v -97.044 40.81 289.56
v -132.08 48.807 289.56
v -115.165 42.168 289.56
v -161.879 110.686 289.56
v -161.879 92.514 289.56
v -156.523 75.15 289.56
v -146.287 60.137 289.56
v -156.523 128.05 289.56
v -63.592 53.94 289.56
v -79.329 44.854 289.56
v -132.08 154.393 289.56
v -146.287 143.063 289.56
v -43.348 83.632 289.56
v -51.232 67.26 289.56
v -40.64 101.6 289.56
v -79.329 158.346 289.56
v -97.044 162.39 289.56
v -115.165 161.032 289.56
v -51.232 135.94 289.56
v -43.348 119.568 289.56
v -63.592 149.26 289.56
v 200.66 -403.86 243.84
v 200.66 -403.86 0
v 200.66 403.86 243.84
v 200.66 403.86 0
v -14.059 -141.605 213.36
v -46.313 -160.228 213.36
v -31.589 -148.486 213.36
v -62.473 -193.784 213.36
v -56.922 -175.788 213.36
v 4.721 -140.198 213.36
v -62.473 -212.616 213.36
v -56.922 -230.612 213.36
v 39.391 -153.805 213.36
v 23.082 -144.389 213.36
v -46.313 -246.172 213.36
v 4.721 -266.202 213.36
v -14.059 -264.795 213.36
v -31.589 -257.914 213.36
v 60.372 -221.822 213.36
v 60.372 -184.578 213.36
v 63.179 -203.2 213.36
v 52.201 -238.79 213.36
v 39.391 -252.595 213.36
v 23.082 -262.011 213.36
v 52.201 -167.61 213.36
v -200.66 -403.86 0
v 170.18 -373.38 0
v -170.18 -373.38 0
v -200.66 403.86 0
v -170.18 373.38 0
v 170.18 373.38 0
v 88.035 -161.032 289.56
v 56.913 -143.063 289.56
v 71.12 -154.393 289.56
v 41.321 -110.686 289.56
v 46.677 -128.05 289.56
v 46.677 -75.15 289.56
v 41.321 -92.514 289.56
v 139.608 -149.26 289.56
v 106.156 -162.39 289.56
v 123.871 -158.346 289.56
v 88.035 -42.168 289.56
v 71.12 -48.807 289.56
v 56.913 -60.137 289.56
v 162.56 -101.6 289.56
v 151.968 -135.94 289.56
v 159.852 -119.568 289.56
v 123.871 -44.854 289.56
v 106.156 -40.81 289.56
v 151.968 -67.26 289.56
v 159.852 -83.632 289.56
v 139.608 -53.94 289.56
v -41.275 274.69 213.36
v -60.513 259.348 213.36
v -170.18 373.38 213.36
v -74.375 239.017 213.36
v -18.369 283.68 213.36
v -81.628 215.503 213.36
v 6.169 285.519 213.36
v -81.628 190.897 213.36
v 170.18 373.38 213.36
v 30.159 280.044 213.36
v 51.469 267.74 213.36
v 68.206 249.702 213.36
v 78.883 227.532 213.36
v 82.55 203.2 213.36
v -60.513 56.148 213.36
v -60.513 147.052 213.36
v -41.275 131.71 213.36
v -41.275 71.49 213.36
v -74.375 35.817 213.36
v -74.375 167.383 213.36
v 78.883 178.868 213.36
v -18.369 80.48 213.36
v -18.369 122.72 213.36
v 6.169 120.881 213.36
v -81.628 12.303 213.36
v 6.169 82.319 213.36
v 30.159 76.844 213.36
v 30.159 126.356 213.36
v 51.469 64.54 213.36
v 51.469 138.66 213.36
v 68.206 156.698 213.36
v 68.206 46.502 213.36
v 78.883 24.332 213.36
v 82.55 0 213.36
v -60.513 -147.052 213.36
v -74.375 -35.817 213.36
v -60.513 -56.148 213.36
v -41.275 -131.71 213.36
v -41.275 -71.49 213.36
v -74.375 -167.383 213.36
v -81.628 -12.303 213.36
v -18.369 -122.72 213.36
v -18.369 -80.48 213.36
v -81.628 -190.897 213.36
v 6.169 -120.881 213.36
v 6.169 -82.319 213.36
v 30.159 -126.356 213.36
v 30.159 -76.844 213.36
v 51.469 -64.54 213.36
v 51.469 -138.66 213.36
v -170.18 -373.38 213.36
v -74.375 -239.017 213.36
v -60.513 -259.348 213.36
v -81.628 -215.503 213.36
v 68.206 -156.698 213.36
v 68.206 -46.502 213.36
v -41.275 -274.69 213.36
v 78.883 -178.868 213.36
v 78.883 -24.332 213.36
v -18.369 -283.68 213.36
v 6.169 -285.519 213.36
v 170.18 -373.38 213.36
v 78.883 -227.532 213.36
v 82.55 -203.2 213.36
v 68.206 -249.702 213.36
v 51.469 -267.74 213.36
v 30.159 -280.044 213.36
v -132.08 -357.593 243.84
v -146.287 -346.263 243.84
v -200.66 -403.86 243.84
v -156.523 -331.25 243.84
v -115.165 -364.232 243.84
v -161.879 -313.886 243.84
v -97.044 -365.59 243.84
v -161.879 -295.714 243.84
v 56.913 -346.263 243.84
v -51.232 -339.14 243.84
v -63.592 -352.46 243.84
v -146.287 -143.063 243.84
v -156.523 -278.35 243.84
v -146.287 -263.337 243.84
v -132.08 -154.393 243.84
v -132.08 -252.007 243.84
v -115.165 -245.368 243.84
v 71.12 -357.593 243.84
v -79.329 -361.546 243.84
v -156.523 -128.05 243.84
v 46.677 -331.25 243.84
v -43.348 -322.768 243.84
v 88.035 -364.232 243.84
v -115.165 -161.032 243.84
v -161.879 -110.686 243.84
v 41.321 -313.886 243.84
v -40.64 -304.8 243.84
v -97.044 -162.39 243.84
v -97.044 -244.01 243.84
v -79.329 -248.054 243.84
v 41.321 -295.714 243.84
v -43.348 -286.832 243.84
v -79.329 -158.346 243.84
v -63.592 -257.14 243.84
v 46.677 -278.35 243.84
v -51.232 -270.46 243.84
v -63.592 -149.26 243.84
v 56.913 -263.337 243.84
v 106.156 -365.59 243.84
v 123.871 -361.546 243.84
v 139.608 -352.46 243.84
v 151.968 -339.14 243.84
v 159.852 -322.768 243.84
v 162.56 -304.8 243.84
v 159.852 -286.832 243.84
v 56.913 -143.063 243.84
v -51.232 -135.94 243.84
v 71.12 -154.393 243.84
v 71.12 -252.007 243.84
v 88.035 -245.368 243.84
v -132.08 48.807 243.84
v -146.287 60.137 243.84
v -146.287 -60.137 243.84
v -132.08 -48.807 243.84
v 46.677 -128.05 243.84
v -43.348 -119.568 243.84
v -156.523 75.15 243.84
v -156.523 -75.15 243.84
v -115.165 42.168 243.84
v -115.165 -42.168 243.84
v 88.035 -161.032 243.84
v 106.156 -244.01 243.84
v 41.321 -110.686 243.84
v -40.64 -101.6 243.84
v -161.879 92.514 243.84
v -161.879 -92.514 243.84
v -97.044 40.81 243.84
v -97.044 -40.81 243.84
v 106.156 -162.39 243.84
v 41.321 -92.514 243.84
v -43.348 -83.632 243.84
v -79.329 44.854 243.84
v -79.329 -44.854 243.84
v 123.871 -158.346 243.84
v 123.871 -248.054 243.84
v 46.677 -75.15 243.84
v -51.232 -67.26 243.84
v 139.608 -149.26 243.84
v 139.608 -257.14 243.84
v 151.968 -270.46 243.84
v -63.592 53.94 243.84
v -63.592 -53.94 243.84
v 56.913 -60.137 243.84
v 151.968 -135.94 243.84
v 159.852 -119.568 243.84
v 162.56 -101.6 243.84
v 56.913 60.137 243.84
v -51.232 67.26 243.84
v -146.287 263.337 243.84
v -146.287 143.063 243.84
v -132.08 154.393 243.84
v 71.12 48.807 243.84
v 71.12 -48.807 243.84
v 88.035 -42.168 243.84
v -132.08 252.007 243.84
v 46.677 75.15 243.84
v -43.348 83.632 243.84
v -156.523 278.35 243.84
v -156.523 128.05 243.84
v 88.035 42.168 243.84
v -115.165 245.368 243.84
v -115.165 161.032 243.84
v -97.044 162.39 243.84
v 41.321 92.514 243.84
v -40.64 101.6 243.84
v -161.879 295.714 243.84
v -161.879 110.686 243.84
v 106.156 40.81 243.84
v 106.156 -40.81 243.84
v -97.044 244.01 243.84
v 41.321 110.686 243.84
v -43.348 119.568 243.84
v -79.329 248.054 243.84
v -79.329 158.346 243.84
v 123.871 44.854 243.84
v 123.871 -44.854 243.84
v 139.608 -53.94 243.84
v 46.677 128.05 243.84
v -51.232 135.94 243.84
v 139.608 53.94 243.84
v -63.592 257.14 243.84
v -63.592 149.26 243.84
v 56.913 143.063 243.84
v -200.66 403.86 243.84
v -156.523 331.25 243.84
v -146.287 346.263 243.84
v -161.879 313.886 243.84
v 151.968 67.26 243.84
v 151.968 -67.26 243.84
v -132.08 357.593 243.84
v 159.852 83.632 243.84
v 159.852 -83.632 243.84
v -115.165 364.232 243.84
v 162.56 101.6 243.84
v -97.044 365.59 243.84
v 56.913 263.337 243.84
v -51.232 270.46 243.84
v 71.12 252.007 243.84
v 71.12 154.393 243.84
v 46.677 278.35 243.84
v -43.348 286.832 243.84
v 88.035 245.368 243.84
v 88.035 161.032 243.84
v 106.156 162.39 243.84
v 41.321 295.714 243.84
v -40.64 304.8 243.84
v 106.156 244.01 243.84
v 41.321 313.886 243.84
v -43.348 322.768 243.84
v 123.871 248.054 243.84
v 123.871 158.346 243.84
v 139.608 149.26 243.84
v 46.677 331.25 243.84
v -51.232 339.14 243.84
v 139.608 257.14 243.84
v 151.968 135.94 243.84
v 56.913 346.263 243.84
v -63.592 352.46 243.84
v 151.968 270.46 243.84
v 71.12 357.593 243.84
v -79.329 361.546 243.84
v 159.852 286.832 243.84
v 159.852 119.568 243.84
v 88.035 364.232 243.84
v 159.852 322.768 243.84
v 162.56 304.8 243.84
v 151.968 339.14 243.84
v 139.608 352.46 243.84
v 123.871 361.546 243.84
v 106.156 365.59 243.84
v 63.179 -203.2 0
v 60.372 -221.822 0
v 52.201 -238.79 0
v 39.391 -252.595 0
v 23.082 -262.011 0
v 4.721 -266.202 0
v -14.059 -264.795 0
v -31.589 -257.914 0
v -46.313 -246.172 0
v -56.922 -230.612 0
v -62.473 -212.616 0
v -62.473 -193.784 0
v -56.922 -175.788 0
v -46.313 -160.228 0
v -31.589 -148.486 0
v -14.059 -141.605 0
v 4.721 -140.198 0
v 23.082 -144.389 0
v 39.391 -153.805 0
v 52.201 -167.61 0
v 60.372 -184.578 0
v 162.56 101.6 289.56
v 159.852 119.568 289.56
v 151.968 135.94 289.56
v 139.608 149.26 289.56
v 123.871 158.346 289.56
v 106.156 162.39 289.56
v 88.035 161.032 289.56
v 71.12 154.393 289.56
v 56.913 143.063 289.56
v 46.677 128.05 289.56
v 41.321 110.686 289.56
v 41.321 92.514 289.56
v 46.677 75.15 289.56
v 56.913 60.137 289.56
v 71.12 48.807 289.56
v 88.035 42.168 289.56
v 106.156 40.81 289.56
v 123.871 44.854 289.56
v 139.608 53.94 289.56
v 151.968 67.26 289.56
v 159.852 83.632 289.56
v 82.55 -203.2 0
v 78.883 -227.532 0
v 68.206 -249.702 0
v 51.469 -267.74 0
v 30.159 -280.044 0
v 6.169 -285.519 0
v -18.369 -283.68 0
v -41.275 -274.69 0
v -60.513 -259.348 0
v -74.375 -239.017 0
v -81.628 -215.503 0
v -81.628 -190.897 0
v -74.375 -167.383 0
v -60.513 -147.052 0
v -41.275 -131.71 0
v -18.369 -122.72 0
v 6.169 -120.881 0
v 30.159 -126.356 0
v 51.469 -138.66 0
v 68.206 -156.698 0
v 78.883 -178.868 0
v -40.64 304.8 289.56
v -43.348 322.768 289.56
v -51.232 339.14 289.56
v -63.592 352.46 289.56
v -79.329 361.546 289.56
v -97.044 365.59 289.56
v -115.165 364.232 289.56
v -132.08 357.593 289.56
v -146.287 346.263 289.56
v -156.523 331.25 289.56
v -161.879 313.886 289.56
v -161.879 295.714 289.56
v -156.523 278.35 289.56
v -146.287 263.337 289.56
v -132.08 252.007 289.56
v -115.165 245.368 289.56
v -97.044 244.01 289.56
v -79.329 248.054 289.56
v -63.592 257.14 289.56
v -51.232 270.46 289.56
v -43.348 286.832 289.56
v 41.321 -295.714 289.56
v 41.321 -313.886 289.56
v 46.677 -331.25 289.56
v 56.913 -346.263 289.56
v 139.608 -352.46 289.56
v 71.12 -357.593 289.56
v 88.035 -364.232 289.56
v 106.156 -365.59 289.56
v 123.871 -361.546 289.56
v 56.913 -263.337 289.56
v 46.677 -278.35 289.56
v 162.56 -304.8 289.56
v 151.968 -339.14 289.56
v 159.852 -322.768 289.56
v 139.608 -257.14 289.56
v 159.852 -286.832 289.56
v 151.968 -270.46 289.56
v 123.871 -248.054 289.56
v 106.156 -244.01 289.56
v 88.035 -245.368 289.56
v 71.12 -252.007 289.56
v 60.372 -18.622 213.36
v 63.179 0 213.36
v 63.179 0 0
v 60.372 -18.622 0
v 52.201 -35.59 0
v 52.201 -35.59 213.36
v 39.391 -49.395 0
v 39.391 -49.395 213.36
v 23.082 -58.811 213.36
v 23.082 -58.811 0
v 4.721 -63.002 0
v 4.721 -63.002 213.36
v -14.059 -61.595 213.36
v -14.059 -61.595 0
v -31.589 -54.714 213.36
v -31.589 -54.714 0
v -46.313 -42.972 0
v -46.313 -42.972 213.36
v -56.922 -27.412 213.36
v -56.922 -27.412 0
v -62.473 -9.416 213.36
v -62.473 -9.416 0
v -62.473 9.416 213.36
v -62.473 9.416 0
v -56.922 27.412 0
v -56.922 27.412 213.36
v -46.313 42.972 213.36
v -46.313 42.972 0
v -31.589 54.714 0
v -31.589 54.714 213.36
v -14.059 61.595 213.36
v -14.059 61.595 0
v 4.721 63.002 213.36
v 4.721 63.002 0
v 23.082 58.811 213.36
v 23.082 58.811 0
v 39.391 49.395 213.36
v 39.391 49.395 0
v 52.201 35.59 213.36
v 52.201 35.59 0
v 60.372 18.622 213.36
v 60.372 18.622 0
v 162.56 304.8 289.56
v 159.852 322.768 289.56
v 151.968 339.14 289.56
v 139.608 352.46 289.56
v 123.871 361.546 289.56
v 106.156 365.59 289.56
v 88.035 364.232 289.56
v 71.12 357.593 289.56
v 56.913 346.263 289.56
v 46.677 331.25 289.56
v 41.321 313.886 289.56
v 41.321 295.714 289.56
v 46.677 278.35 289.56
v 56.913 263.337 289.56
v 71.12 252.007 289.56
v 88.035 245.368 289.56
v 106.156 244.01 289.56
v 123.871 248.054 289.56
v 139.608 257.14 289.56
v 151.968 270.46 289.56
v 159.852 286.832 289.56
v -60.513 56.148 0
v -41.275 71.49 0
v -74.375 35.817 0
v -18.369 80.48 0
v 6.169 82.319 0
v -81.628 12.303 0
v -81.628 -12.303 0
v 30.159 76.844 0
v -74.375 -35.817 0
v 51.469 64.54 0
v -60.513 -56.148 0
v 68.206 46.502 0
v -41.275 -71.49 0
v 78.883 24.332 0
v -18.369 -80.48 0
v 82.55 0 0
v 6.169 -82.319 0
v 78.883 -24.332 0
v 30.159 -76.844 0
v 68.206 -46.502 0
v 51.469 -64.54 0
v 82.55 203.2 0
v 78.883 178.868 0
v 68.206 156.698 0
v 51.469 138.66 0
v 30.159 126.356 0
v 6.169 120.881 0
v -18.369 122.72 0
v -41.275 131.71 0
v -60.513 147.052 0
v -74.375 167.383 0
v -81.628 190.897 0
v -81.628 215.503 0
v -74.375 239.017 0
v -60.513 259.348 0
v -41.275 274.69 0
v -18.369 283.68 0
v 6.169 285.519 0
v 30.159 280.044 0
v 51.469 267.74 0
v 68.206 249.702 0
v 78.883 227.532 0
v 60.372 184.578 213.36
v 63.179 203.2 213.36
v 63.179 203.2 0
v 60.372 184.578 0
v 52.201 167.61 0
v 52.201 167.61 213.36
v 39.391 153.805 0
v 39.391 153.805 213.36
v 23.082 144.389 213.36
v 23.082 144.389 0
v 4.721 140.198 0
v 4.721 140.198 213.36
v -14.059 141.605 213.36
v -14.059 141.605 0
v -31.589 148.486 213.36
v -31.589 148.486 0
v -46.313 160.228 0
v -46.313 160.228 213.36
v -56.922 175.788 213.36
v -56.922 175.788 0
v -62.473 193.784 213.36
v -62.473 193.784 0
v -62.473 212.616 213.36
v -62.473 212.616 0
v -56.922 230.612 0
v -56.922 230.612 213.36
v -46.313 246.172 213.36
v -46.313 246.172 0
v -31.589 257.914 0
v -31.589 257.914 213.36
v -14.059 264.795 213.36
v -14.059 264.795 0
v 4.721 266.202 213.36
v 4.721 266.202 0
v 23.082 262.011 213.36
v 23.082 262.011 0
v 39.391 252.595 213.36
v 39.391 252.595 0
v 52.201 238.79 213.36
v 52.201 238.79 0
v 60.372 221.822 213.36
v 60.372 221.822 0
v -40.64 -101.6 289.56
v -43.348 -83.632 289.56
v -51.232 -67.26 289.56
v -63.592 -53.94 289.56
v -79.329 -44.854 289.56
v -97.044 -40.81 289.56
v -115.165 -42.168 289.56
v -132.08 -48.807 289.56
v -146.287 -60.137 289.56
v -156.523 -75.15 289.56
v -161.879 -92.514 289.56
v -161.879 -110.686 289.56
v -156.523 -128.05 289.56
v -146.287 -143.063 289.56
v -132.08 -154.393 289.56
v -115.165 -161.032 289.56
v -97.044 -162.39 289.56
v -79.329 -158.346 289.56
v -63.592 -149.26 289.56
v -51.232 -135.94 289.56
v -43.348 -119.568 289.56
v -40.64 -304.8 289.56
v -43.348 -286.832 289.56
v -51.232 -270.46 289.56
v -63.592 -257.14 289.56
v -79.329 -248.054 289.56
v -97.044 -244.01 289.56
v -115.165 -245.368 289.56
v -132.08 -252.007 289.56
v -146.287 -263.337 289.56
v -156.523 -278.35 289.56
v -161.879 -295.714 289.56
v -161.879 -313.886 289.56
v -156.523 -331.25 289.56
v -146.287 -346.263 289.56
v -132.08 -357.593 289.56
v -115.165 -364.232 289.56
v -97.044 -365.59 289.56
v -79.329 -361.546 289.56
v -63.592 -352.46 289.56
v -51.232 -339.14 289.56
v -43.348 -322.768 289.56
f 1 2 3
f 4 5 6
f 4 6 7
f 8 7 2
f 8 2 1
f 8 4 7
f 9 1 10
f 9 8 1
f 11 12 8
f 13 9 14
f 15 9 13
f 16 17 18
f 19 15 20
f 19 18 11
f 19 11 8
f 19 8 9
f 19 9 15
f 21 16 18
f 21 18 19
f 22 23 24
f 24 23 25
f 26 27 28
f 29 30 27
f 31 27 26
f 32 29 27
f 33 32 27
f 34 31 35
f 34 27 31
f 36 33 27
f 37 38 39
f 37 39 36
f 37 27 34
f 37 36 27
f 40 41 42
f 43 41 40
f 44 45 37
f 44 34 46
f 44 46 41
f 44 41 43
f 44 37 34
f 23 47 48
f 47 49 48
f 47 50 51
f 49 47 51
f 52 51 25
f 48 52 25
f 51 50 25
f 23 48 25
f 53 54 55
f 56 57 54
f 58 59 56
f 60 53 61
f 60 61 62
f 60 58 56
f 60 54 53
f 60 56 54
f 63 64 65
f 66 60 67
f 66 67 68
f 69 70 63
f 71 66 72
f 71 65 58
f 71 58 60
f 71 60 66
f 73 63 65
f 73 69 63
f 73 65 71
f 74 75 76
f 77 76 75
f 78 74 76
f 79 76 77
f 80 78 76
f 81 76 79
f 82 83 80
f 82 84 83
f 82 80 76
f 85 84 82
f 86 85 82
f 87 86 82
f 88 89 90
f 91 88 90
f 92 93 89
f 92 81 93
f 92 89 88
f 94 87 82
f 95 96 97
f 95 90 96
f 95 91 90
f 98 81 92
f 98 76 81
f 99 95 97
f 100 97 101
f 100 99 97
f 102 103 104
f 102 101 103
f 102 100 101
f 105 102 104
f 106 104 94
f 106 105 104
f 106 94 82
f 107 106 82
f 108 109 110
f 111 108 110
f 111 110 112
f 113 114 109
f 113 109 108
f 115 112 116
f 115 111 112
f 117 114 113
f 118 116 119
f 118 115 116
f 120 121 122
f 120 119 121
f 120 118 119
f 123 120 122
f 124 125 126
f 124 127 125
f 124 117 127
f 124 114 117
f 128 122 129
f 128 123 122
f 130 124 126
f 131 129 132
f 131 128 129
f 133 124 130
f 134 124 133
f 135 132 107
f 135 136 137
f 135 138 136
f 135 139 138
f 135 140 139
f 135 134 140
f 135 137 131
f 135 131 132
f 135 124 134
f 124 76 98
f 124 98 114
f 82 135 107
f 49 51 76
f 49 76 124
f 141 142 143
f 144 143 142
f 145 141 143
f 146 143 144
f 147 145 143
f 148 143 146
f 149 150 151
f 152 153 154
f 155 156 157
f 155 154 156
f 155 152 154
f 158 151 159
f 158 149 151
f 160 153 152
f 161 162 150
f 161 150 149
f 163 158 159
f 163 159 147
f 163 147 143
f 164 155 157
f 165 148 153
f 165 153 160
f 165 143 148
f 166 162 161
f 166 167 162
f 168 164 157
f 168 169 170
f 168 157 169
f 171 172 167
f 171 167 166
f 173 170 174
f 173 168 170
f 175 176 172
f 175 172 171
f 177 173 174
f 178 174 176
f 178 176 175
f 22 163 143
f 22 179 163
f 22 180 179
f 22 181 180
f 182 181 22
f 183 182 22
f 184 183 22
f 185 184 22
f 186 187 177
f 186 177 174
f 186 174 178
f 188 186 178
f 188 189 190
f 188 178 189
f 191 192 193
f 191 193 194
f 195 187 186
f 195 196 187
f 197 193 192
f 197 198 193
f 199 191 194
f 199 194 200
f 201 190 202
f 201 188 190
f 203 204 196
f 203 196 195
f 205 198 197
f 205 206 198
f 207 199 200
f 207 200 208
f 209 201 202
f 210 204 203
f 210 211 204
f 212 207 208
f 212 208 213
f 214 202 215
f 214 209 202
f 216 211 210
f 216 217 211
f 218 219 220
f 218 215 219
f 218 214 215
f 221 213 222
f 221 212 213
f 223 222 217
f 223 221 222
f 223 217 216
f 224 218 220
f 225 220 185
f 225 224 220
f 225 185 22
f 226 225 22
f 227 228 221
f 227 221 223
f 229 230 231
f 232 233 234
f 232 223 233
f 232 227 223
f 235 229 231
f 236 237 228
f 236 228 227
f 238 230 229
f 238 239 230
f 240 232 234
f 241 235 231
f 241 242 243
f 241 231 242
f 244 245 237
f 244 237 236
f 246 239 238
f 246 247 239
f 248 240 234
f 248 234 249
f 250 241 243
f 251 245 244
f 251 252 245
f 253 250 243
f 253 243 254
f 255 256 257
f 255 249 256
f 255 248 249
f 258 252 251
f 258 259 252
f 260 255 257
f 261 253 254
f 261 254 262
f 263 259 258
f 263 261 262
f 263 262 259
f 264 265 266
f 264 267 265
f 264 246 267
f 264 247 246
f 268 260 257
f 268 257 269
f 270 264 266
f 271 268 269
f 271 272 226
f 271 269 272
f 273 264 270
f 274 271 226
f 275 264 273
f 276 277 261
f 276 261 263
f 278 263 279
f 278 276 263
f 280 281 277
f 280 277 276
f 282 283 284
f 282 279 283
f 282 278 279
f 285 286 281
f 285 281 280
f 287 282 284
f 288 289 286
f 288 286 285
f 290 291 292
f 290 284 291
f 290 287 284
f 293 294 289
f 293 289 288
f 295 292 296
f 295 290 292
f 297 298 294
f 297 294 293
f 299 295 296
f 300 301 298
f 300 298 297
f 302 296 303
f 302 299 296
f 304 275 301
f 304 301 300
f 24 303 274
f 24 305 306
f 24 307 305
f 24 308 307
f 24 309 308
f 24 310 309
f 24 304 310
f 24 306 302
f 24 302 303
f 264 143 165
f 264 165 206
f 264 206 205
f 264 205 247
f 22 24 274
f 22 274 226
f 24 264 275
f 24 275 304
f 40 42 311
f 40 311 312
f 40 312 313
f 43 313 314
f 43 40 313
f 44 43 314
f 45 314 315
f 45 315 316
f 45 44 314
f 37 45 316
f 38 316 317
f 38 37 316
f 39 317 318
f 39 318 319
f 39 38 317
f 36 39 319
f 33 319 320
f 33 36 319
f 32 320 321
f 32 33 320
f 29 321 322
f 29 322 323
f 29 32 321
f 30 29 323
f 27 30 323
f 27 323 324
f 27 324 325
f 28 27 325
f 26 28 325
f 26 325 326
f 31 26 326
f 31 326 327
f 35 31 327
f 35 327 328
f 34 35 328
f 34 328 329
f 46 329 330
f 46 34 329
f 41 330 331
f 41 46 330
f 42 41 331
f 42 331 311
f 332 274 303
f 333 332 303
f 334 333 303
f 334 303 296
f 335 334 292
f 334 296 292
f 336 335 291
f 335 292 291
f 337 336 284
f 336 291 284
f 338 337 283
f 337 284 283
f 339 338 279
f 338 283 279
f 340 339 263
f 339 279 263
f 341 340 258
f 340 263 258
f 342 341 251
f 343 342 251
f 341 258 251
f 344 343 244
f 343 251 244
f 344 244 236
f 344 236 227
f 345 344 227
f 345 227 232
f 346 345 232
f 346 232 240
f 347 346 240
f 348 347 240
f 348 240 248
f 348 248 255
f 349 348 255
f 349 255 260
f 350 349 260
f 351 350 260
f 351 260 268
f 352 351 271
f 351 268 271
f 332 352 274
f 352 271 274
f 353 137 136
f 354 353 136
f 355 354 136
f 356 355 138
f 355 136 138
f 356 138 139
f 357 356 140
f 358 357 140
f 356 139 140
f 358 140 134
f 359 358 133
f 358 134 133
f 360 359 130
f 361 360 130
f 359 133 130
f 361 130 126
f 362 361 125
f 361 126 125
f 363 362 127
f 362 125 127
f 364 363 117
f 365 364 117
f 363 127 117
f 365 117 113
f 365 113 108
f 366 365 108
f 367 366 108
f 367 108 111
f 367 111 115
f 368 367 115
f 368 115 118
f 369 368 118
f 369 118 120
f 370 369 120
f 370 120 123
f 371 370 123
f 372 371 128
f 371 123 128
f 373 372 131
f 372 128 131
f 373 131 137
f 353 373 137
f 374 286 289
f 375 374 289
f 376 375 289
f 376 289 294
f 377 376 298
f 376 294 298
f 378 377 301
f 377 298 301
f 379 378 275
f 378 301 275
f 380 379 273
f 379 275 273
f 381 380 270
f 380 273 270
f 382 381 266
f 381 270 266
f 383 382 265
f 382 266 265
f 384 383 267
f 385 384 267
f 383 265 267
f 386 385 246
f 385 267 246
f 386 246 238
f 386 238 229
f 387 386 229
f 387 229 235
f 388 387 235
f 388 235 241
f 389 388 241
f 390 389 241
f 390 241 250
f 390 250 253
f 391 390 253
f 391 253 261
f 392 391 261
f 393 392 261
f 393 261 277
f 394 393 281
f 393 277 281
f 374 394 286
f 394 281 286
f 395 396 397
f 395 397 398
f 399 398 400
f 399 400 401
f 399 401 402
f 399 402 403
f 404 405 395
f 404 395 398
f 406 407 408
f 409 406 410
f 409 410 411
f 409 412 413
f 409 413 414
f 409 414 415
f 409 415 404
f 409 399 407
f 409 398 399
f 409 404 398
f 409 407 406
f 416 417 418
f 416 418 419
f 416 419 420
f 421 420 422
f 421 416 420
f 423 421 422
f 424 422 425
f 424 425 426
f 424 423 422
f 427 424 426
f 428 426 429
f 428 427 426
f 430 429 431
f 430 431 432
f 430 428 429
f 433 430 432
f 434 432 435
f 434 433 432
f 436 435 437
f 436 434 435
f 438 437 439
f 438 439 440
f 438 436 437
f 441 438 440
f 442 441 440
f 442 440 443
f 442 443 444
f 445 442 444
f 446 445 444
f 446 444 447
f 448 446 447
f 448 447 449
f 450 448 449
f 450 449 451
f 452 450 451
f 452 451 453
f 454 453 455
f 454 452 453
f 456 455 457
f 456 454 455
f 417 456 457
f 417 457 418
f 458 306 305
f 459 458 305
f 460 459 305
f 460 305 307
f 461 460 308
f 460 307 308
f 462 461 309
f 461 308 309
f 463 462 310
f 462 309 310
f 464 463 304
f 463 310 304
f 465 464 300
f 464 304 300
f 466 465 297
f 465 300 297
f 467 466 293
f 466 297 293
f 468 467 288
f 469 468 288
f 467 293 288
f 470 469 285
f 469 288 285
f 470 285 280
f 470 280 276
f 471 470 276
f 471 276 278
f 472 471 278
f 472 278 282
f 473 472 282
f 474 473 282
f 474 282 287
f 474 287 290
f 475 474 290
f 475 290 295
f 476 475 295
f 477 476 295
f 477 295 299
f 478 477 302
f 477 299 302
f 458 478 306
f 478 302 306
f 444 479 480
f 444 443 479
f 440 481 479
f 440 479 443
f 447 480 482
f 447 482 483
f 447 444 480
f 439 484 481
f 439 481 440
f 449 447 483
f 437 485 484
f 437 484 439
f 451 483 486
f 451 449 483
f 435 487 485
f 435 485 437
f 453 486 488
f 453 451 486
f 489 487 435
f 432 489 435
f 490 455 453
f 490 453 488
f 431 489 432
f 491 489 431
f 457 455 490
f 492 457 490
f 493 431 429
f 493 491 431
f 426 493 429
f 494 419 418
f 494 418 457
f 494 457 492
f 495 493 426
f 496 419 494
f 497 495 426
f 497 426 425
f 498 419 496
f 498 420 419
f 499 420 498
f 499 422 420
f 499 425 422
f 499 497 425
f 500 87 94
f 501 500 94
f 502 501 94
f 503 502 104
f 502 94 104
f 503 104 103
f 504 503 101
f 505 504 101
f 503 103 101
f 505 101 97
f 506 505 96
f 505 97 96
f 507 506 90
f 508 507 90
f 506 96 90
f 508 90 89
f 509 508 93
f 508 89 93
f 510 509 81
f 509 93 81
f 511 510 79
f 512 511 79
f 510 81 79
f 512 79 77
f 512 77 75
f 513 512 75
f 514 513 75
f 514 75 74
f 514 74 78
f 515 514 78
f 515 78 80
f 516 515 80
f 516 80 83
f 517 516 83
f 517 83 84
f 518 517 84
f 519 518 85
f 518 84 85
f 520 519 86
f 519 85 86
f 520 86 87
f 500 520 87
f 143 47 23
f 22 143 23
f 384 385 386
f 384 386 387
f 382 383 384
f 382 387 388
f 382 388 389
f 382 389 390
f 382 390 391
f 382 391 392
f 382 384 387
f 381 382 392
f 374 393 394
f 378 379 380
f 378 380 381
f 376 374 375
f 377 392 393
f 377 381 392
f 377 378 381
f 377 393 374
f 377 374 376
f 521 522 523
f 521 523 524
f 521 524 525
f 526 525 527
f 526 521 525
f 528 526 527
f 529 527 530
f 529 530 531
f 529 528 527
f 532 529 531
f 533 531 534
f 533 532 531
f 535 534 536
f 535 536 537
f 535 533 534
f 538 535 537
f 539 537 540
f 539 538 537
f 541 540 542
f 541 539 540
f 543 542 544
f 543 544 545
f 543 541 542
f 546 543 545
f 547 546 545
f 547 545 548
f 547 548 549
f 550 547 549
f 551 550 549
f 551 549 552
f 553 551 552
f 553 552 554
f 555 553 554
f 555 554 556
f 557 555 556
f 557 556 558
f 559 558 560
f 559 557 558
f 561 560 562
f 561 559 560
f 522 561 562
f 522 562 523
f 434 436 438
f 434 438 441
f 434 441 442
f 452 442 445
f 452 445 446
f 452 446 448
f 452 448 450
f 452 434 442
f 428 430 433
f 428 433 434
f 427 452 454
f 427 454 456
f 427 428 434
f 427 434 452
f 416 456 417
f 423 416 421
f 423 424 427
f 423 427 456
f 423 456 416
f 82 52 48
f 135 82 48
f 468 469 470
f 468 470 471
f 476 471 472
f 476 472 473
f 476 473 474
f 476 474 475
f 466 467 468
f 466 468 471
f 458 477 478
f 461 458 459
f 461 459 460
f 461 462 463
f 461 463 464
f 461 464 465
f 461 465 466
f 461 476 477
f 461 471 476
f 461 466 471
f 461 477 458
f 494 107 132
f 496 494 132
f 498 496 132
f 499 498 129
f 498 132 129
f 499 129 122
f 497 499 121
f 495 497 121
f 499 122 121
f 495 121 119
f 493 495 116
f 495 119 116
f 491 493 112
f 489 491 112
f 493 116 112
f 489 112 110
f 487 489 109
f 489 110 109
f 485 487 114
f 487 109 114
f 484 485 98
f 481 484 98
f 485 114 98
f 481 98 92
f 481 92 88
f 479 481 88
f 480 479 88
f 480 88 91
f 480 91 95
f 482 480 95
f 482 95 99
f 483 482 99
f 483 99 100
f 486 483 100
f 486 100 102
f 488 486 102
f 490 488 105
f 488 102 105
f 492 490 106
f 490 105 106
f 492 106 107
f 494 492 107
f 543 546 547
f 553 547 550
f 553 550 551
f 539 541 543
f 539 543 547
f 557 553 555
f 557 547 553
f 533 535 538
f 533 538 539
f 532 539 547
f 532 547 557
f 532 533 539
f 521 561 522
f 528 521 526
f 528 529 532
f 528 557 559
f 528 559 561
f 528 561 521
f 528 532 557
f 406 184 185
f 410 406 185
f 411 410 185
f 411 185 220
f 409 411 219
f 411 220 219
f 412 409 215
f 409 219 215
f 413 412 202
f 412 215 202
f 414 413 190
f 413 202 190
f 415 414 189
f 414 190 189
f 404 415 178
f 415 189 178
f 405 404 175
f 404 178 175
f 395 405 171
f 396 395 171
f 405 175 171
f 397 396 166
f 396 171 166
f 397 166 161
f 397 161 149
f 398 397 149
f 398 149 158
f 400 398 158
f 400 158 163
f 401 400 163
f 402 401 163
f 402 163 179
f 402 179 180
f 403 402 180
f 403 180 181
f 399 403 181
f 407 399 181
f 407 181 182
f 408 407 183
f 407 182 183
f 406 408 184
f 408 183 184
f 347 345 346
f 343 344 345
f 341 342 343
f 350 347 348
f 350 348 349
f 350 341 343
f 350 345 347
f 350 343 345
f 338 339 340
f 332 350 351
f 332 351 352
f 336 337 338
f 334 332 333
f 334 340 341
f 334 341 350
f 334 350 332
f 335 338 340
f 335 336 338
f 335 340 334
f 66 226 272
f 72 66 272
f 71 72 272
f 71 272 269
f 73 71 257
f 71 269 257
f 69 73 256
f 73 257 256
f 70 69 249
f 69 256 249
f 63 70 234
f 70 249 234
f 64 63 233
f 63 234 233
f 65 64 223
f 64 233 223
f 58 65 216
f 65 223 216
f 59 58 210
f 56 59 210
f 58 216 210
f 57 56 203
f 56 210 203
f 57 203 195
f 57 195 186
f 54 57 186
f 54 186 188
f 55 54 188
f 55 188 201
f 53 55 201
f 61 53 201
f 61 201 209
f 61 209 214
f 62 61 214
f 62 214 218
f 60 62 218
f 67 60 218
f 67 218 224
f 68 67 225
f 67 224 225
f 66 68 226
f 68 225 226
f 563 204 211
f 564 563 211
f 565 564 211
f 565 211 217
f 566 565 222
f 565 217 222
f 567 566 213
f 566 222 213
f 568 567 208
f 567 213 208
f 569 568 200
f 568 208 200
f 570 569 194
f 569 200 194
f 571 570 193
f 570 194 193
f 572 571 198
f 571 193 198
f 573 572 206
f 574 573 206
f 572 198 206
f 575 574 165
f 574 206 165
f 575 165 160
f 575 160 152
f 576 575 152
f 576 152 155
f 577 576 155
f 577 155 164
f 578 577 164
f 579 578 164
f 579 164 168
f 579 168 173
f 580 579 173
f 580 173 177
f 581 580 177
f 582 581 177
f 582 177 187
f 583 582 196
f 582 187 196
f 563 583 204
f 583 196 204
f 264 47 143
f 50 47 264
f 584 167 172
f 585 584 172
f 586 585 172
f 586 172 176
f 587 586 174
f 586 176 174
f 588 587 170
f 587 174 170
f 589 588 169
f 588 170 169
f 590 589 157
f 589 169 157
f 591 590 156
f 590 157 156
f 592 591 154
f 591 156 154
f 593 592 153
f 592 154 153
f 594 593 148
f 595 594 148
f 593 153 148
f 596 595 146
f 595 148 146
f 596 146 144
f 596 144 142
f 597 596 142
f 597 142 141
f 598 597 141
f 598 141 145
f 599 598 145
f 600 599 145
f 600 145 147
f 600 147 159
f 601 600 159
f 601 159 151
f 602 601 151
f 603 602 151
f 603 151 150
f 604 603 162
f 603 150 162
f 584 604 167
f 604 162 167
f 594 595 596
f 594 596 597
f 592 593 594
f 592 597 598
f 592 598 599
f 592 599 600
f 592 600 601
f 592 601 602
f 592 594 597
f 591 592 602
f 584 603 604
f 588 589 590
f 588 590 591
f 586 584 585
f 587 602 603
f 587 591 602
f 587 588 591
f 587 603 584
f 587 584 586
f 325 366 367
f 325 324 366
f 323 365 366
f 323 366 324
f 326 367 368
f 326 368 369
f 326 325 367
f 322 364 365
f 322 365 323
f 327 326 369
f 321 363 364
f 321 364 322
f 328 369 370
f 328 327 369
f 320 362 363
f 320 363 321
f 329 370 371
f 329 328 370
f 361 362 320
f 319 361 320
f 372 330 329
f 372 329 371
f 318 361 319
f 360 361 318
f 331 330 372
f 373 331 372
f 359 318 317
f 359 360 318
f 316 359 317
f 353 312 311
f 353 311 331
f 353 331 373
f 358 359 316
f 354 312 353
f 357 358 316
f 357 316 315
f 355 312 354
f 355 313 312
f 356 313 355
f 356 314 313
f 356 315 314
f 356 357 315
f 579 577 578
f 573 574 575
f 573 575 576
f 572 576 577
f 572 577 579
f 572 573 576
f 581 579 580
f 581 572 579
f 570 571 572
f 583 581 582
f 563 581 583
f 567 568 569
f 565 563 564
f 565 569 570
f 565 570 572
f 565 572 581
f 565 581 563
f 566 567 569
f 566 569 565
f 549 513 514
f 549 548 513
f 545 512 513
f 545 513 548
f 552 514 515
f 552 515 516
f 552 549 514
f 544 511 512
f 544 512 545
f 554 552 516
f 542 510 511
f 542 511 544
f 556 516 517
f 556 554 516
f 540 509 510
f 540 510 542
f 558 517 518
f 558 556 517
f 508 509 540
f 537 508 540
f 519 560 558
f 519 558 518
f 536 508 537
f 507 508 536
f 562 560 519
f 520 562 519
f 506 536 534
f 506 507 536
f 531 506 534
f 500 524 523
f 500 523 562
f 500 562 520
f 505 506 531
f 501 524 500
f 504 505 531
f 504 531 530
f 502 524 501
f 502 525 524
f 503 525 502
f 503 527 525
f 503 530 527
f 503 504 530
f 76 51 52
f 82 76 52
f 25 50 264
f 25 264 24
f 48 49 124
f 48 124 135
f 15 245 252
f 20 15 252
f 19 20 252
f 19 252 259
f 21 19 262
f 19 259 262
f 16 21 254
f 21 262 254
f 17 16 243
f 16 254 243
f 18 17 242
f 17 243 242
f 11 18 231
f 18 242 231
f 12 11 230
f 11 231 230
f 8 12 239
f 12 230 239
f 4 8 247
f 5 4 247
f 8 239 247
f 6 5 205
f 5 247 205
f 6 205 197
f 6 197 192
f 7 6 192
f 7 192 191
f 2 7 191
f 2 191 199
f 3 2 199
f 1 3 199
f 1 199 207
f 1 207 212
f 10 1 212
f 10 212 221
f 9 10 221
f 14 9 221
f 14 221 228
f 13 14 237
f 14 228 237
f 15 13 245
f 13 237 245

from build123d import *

# Parameters (mm, degrees)
F0_W     = 401.32
F0_H     = 807.72
F1_DEPTH = 243.84
F2_R     = 60.96
F3_DEPTH = 45.72
F4_W     = 340.36
F4_H     = 746.76
F5_DEPTH = 213.36
F6_R     = 82.55
F6_R_2   = 63.178676
F7_DEPTH = 213.36


with BuildPart() as f1:
    # F0 (on Top) → F1 (new body)
    with BuildSketch(Plane.XY):
        Rectangle(F0_W, F0_H)
    extrude(amount=F1_DEPTH)

    # F2 (on face) → F3 (join)
    with BuildSketch(Plane.XY.offset(243.84)):
        with Locations((101.6, 304.8)):
            Circle(F2_R)
        with Locations((101.6, 101.6)):
            Circle(F2_R)
        with Locations((101.6, -101.6)):
            Circle(F2_R)
        with Locations((101.6, -304.8)):
            Circle(F2_R)
        with Locations((-101.6, 304.8)):
            Circle(F2_R)
        with Locations((-101.6, 101.6)):
            Circle(F2_R)
        with Locations((-101.6, -101.6)):
            Circle(F2_R)
        with Locations((-101.6, -304.8)):
            Circle(F2_R)
    extrude(amount=F3_DEPTH)

    # F4 (on face) → F5 (cut)
    with BuildSketch(Plane(origin=(0, 0, 0), x_dir=(1, 0, 0), z_dir=(0, 0, -1))):
        Rectangle(F4_W, F4_H)
    extrude(amount=-F5_DEPTH, mode=Mode.SUBTRACT)

    # F6 (on face) → F7 (join)
    with BuildSketch(Plane(origin=(0, 0, 213.36), x_dir=(1, 0, 0), z_dir=(0, 0, -1))):
        Circle(F6_R)
        Circle(F6_R_2, mode=Mode.SUBTRACT)
        with Locations((0, 203.2)):
            Circle(F6_R)
        with Locations((0, 203.2)):
            Circle(F6_R_2, mode=Mode.SUBTRACT)
        with Locations((0, -203.2)):
            Circle(F6_R)
        with Locations((0, -203.2)):
            Circle(F6_R_2, mode=Mode.SUBTRACT)
    extrude(amount=F7_DEPTH)


solid = f1.part
